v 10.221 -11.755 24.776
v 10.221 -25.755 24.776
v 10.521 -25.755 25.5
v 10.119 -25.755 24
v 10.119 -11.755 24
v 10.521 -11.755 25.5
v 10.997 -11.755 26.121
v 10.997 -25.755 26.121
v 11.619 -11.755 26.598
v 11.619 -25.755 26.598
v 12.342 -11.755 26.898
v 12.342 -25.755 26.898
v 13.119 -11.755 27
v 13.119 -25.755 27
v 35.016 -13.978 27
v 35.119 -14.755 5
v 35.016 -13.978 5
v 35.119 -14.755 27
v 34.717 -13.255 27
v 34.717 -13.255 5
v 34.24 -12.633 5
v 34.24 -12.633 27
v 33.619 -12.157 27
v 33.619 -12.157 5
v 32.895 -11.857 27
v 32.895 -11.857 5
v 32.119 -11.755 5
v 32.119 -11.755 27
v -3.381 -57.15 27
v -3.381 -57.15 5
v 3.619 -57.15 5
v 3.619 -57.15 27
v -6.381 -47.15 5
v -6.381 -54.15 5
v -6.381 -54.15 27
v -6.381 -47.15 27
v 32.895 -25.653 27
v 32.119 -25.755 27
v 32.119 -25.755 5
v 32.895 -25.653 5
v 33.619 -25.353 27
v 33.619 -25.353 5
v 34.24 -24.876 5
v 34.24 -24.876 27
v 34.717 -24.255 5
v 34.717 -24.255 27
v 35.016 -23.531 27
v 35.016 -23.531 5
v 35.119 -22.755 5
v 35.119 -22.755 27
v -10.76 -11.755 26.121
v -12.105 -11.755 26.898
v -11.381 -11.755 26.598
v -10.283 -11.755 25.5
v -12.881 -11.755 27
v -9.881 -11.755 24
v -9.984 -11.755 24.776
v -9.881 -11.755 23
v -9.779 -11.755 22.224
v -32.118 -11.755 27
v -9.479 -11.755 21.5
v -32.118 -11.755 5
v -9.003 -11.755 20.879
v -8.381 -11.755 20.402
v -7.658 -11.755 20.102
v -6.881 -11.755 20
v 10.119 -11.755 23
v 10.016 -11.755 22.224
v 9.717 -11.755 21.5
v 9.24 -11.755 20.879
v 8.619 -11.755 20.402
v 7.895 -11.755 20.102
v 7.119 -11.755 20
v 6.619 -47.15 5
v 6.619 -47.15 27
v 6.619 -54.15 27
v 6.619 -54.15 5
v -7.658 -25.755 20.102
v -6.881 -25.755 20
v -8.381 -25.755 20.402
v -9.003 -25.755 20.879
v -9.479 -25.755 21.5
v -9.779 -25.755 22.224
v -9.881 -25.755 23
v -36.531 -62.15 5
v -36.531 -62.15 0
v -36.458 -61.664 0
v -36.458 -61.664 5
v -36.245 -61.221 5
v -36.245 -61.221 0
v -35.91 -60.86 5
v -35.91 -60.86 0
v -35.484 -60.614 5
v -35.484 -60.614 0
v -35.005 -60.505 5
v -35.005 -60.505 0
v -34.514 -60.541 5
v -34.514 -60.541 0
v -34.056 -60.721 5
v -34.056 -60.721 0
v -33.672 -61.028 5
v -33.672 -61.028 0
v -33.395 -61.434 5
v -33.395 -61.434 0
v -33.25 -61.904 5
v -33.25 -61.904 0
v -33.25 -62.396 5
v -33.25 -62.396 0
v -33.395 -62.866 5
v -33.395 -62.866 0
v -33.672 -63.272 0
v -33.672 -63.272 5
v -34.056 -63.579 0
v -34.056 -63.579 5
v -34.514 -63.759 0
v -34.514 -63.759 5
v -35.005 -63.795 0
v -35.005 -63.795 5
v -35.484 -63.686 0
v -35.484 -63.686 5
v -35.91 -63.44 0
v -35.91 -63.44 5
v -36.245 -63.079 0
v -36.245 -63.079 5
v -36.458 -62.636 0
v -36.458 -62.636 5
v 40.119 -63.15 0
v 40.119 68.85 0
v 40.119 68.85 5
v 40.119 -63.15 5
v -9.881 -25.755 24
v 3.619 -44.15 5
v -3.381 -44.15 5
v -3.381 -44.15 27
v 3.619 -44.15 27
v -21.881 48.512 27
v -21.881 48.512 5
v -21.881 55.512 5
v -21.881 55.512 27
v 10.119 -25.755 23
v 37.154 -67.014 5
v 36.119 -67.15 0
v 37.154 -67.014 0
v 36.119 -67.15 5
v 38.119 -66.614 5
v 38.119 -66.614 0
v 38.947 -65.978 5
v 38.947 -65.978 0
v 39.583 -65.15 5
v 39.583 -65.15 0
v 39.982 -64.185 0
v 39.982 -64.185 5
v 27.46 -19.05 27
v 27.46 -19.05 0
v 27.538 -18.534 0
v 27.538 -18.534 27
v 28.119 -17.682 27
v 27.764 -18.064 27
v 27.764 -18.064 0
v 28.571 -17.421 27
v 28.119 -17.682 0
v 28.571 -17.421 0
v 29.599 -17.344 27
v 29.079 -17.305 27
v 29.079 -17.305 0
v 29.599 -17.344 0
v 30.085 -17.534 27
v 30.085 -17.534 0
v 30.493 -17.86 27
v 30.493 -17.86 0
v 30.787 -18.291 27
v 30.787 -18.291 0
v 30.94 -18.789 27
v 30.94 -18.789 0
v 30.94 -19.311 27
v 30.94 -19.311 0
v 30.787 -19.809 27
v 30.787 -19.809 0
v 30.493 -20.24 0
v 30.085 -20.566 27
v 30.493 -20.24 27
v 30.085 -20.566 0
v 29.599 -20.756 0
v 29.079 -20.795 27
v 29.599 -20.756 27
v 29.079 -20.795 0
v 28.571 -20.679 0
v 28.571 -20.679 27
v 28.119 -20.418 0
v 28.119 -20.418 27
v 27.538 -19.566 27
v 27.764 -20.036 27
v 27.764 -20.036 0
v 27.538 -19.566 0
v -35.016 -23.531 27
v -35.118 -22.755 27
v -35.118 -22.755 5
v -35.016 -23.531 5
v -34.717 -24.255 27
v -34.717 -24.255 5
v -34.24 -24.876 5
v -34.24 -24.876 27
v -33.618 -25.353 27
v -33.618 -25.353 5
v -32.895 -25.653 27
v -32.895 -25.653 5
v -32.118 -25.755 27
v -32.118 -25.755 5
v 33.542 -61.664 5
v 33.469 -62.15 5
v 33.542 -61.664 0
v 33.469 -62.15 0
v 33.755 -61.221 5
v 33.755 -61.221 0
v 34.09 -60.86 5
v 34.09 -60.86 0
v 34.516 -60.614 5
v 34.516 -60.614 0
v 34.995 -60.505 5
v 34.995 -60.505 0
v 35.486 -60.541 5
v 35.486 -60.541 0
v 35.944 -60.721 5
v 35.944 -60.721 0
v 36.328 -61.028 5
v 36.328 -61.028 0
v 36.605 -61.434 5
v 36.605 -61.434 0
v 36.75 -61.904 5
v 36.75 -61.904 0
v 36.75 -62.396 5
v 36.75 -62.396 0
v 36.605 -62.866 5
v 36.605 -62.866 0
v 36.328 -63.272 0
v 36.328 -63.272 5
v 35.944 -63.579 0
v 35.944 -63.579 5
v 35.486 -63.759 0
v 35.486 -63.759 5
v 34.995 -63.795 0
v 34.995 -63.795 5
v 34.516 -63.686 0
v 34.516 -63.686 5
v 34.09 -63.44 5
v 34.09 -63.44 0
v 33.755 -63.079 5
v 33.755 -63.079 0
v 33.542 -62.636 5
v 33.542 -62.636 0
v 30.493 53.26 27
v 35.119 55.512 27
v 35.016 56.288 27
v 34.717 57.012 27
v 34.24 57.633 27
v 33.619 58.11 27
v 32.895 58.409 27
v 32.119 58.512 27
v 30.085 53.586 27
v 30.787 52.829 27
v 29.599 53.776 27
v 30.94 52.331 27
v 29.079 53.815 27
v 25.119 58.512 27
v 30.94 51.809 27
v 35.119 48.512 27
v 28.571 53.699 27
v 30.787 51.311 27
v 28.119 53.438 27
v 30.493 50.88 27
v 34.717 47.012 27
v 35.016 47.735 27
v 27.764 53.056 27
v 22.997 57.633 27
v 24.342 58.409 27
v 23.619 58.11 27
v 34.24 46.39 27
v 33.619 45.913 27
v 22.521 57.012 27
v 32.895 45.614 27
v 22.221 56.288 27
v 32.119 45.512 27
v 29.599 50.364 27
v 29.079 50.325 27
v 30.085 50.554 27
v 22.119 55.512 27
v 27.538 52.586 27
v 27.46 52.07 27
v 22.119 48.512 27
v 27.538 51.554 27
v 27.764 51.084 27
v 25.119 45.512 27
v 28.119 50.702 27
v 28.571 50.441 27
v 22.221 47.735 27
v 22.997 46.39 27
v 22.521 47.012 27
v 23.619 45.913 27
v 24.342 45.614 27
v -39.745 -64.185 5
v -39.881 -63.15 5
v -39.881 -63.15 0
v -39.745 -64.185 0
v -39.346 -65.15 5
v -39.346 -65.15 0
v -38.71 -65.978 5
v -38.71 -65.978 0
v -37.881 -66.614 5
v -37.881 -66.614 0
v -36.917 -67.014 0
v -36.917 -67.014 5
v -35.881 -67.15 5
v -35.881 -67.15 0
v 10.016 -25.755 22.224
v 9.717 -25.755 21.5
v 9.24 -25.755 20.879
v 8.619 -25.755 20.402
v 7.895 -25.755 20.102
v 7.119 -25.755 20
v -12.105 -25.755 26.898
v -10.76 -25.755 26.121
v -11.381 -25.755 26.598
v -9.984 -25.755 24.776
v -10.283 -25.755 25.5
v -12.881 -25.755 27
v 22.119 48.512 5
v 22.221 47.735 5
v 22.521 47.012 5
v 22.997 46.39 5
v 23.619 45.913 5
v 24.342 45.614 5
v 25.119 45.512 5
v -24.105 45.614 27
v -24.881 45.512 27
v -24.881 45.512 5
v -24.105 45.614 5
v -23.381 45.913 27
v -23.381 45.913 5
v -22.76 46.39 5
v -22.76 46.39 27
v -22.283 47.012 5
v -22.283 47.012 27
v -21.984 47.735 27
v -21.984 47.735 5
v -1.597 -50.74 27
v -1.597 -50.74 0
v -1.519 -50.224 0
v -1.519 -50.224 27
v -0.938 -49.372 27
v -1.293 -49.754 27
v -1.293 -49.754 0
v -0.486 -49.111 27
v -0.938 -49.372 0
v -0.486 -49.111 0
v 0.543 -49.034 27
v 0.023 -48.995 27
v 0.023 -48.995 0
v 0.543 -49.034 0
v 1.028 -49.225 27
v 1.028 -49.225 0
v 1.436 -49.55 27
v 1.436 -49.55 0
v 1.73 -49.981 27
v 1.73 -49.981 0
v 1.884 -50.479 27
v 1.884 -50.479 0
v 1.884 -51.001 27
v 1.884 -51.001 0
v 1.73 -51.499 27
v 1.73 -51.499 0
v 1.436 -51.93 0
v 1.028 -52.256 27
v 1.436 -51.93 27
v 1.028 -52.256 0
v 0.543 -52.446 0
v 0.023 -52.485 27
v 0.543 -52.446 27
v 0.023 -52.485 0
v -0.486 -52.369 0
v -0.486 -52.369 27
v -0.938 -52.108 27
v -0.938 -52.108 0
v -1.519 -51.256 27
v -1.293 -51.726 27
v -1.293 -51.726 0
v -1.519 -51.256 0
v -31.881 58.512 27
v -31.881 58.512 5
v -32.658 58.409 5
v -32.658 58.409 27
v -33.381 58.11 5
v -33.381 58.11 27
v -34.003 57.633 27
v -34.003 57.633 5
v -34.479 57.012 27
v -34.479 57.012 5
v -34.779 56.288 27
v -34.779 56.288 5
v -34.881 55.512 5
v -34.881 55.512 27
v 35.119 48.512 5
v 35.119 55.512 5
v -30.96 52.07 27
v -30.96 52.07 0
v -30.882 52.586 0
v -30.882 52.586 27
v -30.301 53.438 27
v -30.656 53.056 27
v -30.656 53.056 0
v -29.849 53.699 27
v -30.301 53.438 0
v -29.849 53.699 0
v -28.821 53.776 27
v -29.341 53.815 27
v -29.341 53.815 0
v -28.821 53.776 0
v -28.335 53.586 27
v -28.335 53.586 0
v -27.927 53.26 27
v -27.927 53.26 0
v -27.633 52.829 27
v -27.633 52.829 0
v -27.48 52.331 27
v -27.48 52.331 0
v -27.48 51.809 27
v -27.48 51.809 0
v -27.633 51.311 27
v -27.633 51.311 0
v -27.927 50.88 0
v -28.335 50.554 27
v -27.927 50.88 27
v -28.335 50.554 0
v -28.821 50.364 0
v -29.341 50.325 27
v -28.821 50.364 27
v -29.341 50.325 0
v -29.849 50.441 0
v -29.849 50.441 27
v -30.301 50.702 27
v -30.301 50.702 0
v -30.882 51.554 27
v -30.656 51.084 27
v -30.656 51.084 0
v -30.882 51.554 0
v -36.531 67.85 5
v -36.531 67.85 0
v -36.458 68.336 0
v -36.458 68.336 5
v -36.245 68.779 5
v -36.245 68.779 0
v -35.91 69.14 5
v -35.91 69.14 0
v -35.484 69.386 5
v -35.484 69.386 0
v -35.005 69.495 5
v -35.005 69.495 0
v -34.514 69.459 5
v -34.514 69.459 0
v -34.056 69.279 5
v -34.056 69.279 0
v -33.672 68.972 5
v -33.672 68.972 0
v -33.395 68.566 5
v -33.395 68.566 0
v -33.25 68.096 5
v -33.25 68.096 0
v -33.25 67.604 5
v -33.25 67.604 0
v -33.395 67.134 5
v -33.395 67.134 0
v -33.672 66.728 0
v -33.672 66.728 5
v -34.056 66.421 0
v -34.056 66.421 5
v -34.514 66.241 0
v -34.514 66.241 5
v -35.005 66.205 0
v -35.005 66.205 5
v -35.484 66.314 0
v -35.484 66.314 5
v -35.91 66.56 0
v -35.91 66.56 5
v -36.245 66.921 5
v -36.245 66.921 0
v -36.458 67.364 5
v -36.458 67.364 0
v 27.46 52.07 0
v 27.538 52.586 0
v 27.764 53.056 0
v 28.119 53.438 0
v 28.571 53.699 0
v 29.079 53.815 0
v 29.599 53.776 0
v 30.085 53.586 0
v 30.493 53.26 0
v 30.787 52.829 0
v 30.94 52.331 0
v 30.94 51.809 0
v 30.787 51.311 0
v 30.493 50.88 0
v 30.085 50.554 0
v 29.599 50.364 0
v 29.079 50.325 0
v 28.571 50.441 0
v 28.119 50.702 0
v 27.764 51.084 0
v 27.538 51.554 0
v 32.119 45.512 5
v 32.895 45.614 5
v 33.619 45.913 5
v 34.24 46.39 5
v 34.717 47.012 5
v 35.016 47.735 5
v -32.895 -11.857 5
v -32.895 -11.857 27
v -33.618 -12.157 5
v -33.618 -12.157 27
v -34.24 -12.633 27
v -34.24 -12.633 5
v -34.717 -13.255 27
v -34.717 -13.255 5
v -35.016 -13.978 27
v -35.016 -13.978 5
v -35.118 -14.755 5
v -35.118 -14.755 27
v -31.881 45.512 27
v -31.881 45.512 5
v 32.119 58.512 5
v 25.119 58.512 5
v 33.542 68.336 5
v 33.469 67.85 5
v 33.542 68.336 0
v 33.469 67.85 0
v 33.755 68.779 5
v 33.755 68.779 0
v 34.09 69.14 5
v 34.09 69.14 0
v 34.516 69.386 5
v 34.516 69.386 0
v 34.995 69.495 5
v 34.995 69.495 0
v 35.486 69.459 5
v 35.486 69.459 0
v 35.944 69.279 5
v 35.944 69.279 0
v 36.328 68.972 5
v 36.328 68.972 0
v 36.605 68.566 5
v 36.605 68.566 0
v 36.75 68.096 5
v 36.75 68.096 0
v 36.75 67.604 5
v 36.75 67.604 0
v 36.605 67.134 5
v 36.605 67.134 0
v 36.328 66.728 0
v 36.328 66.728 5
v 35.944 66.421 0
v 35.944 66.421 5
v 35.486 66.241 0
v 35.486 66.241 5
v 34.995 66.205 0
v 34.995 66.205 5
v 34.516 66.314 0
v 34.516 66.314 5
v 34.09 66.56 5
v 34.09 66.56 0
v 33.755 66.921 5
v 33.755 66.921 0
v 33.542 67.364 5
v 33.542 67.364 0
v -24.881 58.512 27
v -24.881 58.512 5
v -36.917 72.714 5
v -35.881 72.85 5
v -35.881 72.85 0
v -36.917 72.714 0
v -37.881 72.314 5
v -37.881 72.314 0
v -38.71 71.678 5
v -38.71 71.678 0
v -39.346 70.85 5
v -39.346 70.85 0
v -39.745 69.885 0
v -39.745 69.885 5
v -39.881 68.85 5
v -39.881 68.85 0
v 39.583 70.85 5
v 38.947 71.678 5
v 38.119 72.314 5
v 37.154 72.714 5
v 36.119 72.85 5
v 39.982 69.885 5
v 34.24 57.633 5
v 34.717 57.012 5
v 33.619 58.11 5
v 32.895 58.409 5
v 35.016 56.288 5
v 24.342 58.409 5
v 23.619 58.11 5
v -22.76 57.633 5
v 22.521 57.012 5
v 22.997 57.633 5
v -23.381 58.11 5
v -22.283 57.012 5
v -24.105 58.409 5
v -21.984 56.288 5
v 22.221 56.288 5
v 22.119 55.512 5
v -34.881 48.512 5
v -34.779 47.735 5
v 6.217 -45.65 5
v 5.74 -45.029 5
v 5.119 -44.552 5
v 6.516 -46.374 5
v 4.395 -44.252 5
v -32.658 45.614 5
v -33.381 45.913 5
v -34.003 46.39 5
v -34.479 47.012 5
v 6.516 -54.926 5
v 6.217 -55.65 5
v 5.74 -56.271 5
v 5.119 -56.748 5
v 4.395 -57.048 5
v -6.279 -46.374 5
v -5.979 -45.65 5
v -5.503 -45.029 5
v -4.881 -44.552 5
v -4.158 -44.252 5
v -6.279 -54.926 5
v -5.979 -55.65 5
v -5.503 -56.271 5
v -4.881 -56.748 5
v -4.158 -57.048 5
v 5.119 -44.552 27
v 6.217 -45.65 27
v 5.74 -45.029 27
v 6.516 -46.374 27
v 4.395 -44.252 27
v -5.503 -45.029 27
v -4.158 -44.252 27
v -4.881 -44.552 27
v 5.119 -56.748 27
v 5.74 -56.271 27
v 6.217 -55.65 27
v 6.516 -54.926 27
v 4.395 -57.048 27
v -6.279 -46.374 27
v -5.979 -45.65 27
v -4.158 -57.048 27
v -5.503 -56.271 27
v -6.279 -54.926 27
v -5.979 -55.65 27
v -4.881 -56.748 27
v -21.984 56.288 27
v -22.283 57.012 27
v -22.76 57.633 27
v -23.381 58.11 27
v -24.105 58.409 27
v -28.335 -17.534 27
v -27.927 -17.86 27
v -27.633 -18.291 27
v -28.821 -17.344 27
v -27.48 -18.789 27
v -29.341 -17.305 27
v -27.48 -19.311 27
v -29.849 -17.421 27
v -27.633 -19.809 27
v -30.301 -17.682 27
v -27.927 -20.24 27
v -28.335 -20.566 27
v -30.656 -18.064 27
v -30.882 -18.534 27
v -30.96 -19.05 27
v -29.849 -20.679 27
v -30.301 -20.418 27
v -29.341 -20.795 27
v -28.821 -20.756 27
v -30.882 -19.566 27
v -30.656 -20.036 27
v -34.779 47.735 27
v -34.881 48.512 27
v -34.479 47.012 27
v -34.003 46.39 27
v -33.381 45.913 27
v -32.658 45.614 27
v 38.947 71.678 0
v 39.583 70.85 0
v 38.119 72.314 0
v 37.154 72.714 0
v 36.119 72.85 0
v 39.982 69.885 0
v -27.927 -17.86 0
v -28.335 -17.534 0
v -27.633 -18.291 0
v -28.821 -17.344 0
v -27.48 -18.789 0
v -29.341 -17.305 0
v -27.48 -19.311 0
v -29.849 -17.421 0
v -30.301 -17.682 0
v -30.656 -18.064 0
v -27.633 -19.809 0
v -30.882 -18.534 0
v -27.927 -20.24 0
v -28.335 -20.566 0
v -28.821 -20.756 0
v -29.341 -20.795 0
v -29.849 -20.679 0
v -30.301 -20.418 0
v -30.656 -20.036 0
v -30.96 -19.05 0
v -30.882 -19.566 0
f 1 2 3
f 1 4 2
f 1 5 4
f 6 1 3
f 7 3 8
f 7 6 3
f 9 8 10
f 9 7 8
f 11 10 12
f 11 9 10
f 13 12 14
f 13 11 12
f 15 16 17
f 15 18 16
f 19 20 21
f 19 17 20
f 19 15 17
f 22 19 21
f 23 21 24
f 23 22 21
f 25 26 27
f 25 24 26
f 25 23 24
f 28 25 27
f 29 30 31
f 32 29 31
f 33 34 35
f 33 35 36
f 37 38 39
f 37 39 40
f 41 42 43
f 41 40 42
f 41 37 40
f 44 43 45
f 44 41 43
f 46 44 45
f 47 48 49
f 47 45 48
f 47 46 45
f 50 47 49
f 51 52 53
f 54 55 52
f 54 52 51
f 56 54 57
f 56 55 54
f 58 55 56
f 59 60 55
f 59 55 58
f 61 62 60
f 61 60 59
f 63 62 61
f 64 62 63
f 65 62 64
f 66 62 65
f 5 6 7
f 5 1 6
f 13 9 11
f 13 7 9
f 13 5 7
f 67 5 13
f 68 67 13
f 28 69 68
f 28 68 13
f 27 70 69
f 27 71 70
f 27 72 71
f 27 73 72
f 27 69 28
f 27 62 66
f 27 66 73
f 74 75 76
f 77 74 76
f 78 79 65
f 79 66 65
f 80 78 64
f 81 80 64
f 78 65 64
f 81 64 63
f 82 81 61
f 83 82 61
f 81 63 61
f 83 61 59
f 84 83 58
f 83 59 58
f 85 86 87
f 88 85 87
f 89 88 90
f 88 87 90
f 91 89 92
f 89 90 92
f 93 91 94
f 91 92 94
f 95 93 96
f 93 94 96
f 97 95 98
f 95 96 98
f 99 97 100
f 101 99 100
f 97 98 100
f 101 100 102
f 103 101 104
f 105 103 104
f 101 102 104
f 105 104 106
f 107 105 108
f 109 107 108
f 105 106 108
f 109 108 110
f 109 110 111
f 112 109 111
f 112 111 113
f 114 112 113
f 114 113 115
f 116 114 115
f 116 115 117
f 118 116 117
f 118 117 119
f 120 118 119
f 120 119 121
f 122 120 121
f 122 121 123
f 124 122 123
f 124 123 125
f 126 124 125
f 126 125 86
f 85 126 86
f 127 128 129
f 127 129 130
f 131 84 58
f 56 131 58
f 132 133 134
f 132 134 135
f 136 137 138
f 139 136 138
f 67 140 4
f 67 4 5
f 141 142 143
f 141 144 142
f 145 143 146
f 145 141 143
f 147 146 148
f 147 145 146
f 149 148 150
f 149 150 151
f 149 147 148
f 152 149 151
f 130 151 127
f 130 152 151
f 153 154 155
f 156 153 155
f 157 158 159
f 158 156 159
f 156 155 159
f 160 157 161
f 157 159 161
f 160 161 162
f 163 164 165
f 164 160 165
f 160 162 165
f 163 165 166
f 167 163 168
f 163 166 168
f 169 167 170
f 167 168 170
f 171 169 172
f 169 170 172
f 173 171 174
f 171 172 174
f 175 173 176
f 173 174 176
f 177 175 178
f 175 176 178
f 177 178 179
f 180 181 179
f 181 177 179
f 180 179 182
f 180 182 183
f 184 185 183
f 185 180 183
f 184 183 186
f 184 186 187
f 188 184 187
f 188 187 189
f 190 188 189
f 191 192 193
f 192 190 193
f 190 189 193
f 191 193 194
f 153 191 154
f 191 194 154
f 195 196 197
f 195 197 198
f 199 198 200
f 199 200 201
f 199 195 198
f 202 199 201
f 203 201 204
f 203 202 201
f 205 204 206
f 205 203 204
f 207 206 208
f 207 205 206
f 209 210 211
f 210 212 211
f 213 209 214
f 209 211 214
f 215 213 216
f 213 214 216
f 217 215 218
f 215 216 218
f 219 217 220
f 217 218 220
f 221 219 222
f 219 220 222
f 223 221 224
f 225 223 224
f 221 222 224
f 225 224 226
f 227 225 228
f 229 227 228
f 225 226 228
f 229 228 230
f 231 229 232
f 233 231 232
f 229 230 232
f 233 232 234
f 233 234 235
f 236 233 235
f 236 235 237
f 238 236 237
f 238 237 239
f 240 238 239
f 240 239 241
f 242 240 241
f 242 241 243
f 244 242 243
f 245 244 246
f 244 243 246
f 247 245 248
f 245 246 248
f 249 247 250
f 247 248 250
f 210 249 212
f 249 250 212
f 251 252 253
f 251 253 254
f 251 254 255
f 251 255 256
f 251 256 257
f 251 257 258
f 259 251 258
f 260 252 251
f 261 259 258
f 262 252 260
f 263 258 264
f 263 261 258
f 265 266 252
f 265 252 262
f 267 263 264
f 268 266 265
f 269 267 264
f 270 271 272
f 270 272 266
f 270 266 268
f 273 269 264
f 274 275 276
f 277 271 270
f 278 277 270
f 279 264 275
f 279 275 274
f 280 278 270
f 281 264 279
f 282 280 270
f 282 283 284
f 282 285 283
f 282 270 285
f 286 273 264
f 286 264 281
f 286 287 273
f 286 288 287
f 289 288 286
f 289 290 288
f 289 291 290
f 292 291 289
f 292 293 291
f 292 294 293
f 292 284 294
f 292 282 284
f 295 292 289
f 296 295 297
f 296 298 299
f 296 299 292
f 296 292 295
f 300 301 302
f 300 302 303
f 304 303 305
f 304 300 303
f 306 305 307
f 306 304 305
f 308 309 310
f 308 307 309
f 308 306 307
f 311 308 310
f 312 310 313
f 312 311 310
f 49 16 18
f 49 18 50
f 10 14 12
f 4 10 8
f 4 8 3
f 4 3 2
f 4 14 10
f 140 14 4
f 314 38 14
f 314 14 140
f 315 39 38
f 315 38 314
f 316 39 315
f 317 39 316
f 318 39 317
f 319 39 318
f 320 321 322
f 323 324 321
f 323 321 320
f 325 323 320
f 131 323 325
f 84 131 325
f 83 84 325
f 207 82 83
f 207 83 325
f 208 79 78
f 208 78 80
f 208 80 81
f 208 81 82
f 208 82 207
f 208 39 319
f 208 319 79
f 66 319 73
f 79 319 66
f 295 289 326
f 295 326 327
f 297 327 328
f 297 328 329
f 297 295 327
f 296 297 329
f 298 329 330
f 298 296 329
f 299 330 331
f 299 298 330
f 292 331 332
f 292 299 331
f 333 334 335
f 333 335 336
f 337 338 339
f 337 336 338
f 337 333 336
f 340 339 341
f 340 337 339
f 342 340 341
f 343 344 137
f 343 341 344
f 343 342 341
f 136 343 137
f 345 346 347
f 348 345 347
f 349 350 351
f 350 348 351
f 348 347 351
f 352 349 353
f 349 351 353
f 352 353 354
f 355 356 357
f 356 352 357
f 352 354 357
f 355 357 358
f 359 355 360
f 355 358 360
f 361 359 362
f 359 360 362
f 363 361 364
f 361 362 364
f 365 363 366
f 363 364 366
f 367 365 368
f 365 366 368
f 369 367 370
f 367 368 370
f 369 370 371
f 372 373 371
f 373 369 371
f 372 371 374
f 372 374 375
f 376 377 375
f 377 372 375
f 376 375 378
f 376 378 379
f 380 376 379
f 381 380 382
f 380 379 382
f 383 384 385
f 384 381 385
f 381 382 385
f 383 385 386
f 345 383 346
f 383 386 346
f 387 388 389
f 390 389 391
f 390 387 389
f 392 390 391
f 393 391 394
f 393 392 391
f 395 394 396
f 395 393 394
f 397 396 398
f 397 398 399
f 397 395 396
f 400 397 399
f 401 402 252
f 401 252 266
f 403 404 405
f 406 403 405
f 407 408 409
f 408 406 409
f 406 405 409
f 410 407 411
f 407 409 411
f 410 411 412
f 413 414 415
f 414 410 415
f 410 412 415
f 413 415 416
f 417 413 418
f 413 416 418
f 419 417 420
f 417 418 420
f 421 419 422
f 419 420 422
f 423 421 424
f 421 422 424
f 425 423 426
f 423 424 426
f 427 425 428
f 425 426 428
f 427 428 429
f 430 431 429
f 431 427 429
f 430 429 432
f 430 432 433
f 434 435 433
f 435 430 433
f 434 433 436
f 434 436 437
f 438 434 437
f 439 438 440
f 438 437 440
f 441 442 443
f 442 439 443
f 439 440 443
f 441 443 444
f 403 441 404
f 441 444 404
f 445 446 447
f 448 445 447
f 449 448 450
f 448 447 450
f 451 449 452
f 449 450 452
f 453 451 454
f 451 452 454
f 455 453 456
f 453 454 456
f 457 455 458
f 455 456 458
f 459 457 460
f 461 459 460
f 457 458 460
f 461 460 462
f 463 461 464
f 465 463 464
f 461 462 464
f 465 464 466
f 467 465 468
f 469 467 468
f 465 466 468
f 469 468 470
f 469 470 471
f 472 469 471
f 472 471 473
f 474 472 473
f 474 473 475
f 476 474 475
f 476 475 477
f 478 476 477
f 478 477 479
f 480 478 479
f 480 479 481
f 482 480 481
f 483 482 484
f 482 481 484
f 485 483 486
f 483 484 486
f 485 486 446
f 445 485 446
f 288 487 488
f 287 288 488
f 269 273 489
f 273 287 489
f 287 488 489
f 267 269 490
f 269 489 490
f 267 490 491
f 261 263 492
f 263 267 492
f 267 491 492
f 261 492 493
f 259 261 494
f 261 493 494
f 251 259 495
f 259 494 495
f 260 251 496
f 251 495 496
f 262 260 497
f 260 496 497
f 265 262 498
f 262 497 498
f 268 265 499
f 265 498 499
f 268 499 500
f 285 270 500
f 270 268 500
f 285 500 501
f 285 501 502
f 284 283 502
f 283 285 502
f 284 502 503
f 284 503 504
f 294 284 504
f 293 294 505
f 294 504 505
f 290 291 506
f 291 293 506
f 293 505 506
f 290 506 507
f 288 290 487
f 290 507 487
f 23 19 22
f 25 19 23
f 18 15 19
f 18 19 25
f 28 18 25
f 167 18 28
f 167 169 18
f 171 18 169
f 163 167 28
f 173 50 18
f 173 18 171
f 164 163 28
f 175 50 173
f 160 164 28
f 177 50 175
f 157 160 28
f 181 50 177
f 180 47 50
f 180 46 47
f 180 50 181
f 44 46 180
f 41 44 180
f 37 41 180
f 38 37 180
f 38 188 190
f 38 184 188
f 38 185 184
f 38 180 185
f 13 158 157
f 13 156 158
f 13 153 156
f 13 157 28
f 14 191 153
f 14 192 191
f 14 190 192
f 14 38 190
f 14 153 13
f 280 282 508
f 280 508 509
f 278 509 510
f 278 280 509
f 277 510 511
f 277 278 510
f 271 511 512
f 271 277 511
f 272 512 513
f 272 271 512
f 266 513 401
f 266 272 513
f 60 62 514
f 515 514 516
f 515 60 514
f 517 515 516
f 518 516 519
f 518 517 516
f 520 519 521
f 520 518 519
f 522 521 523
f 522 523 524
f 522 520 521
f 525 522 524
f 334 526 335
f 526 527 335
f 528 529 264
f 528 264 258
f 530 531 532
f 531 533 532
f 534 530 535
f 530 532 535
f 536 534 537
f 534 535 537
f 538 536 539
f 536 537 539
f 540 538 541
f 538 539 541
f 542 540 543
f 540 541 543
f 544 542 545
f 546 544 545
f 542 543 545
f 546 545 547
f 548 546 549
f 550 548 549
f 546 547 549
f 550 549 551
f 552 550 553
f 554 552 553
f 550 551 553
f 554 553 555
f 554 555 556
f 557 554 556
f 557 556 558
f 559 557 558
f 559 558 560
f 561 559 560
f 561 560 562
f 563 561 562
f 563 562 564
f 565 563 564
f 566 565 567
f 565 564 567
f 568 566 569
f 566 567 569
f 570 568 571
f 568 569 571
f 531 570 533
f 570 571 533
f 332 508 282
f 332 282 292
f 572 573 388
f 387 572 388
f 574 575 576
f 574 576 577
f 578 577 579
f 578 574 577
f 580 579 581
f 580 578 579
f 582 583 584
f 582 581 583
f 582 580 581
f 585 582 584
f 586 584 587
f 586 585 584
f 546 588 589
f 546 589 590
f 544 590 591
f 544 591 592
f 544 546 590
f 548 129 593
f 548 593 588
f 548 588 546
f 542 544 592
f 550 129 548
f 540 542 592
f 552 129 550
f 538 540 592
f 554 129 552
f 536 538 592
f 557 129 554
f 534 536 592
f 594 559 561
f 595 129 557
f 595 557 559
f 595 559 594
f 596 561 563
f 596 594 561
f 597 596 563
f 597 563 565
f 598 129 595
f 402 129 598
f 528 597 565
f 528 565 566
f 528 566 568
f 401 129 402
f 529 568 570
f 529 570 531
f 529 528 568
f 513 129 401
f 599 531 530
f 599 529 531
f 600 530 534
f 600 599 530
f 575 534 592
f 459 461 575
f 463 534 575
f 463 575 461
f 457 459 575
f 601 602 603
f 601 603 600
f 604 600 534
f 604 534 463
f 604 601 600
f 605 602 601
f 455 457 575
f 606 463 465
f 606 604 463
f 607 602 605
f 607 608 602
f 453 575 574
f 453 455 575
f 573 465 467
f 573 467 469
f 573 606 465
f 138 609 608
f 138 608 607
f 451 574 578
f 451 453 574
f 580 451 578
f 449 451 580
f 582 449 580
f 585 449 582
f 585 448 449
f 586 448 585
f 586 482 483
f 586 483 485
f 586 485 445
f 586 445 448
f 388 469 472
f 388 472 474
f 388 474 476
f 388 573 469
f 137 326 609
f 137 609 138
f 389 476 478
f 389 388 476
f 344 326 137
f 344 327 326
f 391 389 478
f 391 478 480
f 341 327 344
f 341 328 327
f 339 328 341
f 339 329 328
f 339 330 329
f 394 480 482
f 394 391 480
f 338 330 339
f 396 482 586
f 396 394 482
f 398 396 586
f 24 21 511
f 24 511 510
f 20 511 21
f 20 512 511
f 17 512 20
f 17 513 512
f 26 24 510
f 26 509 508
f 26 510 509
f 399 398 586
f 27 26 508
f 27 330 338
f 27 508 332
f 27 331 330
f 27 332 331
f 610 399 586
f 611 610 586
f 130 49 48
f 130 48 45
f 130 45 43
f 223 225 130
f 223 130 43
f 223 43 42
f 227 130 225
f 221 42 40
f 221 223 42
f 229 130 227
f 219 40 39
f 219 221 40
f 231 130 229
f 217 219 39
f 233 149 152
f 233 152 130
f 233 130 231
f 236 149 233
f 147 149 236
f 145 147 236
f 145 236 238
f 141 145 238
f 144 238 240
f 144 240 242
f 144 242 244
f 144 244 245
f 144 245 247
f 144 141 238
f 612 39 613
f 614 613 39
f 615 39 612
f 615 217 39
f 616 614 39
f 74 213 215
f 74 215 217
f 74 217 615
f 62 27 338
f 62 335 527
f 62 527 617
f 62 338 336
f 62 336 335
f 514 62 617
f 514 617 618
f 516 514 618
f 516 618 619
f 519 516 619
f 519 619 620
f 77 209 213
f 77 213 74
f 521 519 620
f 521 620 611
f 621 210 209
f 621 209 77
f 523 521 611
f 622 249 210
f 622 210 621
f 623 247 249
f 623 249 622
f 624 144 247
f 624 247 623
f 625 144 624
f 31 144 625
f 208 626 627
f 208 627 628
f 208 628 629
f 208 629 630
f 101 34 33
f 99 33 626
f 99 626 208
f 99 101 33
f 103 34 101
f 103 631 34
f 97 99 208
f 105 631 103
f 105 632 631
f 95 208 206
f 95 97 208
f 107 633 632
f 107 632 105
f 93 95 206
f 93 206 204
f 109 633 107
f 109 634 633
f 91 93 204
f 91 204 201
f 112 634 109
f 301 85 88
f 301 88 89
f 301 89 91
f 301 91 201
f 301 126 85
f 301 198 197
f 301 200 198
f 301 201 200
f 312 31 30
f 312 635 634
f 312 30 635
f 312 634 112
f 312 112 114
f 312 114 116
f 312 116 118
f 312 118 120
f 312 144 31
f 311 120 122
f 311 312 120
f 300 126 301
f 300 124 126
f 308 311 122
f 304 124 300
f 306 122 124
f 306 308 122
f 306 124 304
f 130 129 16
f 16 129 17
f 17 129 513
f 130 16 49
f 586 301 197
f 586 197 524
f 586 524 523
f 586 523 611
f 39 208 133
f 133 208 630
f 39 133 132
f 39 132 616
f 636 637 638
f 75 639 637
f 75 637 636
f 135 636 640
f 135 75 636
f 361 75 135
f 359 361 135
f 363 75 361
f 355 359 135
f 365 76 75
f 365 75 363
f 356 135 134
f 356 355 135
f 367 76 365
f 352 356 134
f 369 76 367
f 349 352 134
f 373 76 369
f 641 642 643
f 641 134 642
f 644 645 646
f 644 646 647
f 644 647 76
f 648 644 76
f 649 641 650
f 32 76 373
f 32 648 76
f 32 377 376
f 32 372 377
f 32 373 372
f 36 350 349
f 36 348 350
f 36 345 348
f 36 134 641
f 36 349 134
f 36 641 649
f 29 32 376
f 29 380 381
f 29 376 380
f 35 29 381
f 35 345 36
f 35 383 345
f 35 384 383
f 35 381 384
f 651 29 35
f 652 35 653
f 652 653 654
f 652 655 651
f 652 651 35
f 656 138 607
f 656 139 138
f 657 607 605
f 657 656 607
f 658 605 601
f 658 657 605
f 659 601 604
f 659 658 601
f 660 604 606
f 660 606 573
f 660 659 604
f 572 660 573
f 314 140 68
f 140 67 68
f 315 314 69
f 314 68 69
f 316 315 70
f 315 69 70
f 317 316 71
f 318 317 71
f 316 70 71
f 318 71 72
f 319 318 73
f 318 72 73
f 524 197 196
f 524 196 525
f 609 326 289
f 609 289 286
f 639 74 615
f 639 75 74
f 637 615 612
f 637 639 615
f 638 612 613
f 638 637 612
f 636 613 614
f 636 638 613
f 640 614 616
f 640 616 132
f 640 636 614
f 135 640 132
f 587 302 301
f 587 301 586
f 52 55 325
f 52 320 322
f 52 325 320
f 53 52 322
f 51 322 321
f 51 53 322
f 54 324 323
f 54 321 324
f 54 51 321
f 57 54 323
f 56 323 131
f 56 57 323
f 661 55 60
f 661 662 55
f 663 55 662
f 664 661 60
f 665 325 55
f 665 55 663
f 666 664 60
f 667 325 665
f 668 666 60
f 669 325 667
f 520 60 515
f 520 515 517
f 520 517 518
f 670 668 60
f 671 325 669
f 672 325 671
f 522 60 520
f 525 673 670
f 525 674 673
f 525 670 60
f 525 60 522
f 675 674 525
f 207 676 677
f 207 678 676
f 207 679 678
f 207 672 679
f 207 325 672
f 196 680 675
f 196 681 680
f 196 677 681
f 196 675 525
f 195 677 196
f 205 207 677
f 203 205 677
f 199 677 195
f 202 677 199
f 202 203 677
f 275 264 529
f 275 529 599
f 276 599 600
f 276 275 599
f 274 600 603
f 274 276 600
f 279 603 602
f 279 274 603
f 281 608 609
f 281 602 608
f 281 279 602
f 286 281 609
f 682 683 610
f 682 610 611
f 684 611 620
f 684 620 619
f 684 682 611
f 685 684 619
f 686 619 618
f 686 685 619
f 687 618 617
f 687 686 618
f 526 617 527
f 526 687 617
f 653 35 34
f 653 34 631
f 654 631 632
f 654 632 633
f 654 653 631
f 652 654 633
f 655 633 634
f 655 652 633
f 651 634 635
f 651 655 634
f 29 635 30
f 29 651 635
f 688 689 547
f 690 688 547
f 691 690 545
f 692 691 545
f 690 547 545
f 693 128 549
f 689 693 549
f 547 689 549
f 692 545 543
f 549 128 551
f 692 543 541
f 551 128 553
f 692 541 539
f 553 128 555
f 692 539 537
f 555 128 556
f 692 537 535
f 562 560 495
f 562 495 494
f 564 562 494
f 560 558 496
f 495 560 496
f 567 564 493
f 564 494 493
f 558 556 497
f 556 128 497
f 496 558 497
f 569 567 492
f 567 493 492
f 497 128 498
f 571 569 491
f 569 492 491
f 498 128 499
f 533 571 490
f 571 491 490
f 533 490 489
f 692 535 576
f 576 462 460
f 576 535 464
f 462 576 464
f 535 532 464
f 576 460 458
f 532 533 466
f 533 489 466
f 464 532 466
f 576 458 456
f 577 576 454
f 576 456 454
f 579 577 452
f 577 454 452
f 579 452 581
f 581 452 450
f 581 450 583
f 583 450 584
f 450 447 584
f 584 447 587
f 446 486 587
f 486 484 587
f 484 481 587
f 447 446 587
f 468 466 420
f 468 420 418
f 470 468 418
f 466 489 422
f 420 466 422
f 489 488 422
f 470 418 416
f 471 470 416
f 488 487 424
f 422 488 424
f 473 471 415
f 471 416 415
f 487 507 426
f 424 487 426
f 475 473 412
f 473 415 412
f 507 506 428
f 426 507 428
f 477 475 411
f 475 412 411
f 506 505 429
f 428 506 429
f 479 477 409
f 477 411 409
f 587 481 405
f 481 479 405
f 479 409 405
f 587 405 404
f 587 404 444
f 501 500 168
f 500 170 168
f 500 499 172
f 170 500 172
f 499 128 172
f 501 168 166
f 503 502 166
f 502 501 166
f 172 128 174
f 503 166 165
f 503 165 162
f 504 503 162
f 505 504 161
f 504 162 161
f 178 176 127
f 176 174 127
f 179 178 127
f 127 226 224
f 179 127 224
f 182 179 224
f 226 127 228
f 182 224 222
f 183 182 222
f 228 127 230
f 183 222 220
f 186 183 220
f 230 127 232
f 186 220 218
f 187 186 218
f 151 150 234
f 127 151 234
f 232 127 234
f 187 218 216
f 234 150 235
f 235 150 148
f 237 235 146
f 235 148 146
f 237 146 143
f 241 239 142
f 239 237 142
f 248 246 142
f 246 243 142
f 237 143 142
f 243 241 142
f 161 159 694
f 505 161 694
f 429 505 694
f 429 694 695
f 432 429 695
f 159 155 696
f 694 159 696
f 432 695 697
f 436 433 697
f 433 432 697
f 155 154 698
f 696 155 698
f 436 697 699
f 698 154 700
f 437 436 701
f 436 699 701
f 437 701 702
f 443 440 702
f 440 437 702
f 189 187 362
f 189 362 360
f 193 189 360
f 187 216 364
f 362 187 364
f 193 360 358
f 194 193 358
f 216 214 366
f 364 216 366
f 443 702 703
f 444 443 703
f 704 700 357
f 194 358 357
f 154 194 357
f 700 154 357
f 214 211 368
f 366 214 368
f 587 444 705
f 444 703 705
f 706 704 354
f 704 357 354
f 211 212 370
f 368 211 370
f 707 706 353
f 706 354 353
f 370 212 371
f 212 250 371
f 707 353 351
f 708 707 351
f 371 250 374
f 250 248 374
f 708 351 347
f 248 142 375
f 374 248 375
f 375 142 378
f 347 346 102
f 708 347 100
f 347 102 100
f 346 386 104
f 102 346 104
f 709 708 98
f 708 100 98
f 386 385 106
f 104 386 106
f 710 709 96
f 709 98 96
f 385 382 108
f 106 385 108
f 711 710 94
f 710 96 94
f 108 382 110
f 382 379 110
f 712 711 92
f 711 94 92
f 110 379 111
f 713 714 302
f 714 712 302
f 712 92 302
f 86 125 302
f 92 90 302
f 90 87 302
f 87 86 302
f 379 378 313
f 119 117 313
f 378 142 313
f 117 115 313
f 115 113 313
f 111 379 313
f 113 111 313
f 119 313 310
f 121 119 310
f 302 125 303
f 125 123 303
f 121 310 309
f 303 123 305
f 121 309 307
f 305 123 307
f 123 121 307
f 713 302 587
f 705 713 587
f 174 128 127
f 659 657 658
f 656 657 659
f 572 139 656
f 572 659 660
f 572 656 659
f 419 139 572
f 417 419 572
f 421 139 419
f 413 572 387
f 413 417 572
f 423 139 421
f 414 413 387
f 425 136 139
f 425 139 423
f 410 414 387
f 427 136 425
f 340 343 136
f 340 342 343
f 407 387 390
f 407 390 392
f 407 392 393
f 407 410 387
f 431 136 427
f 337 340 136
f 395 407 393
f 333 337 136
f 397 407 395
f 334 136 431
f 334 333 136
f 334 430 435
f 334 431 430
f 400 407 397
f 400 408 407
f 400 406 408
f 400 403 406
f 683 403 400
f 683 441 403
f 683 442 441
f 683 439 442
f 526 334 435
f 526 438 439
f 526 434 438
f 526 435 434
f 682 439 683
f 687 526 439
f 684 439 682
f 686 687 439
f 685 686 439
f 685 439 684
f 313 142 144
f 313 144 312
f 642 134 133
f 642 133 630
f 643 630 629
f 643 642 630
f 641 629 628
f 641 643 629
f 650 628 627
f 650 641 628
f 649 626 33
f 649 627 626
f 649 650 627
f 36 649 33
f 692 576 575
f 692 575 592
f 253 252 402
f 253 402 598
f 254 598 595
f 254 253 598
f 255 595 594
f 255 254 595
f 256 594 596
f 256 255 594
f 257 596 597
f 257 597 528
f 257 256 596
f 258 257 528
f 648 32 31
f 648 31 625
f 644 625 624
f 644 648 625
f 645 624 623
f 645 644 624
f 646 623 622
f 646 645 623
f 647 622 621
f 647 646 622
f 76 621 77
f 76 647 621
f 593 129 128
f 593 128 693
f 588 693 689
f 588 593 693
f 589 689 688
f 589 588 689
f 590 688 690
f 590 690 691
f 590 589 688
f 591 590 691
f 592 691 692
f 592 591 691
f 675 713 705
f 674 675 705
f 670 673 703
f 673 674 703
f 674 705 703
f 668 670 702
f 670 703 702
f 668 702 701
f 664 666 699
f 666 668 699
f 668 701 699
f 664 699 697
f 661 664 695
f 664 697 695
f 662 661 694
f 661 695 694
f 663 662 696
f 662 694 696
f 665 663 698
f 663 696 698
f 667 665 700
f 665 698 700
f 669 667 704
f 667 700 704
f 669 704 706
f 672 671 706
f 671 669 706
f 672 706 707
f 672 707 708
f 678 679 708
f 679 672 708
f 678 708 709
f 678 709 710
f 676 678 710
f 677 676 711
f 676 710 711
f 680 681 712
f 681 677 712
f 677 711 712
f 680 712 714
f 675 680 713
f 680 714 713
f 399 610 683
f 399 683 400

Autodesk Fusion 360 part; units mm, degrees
sketch "Sketch2" plane through (0, 0, 0) normal (0, 0, 1) x (-1, 0, 0)
  line L0 (29.6528, -57.1307) -> (30.0921, -57.0728)
  line L1 (30.0921, -57.0728) -> (30.5248, -56.9769)
  line L2 (30.5248, -56.9769) -> (30.9475, -56.8436)
  line L3 (30.9475, -56.8436) -> (31.3569, -56.674)
  line L4 (31.3569, -56.674) -> (31.75, -56.4694)
  line L5 (31.75, -56.4694) -> (32.1238, -56.2313)
  line L6 (32.1238, -56.2313) -> (32.4754, -55.9615)
  line L7 (32.4754, -55.9615) -> (32.8021, -55.6621)
  line L8 (32.8021, -55.6621) -> (33.1015, -55.3354)
  line L9 (33.1015, -55.3354) -> (33.3713, -54.9838)
  line L10 (33.3713, -54.9838) -> (33.6094, -54.61)
  line L11 (33.6094, -54.61) -> (33.814, -54.2169)
  line L12 (33.814, -54.2169) -> (33.9836, -53.8075)
  line L13 (33.9836, -53.8075) -> (34.1169, -53.3848)
  line L14 (34.1169, -53.3848) -> (34.2128, -52.9521)
  line L15 (34.2128, -52.9521) -> (34.2707, -52.5128)
  line L16 (34.2707, -52.5128) -> (34.29, -52.07)
  line L17 (34.29, -52.07) -> (34.29, 52.07)
  line L18 (34.29, 52.07) -> (34.2707, 52.5128)
  line L19 (34.2707, 52.5128) -> (34.2128, 52.9521)
  line L20 (34.2128, 52.9521) -> (34.1169, 53.3848)
  line L21 (34.1169, 53.3848) -> (33.9836, 53.8075)
  line L22 (33.9836, 53.8075) -> (33.814, 54.2169)
  line L23 (33.814, 54.2169) -> (33.6094, 54.61)
  line L24 (33.6094, 54.61) -> (33.3713, 54.9838)
  line L25 (33.3713, 54.9838) -> (33.1015, 55.3354)
  line L26 (33.1015, 55.3354) -> (32.8021, 55.6621)
  line L27 (32.8021, 55.6621) -> (32.4754, 55.9615)
  line L28 (32.4754, 55.9615) -> (32.1238, 56.2313)
  line L29 (32.1238, 56.2313) -> (31.75, 56.4694)
  line L30 (31.75, 56.4694) -> (31.3569, 56.674)
  line L31 (31.3569, 56.674) -> (30.9475, 56.8436)
  line L32 (30.9475, 56.8436) -> (30.5248, 56.9769)
  line L33 (30.5248, 56.9769) -> (30.0921, 57.0728)
  line L34 (30.0921, 57.0728) -> (29.6528, 57.1307)
  line L35 (29.6528, 57.1307) -> (29.21, 57.15)
  line L36 (29.21, 57.15) -> (-29.21, 57.15)
  line L37 (-29.21, 57.15) -> (-29.6528, 57.1307)
  line L38 (-29.6528, 57.1307) -> (-30.0921, 57.0728)
  line L39 (-30.0921, 57.0728) -> (-30.5248, 56.9769)
  line L40 (-30.5248, 56.9769) -> (-30.9475, 56.8436)
  line L41 (-30.9475, 56.8436) -> (-31.3569, 56.674)
  line L42 (-31.3569, 56.674) -> (-31.75, 56.4694)
  line L43 (-31.75, 56.4694) -> (-32.1238, 56.2313)
  line L44 (-32.1238, 56.2313) -> (-32.4754, 55.9615)
  line L45 (-32.4754, 55.9615) -> (-32.8021, 55.6621)
  line L46 (-32.8021, 55.6621) -> (-33.1015, 55.3354)
  line L47 (-33.1015, 55.3354) -> (-33.3713, 54.9838)
  line L48 (-33.3713, 54.9838) -> (-33.6094, 54.61)
  line L49 (-33.6094, 54.61) -> (-33.814, 54.2169)
  line L50 (-33.814, 54.2169) -> (-33.9836, 53.8075)
  line L51 (-33.9836, 53.8075) -> (-34.1169, 53.3848)
  line L52 (-34.1169, 53.3848) -> (-34.2128, 52.9521)
  line L53 (-34.2128, 52.9521) -> (-34.2707, 52.5128)
  line L54 (-34.2707, 52.5128) -> (-34.29, 52.07)
  line L55 (-34.29, 52.07) -> (-34.29, -52.07)
  line L56 (-34.29, -52.07) -> (-34.2707, -52.5128)
  line L57 (-34.2707, -52.5128) -> (-34.2128, -52.9521)
  line L58 (-34.2128, -52.9521) -> (-34.1169, -53.3848)
  line L59 (-34.1169, -53.3848) -> (-33.9836, -53.8075)
  line L60 (-33.9836, -53.8075) -> (-33.814, -54.2169)
  line L61 (-33.814, -54.2169) -> (-33.6094, -54.61)
  line L62 (-33.6094, -54.61) -> (-33.3713, -54.9838)
  line L63 (-33.3713, -54.9838) -> (-33.1015, -55.3354)
  line L64 (-33.1015, -55.3354) -> (-32.8021, -55.6621)
  line L65 (-32.8021, -55.6621) -> (-32.4754, -55.9615)
  line L66 (-32.4754, -55.9615) -> (-32.1238, -56.2313)
  line L67 (-32.1238, -56.2313) -> (-31.75, -56.4694)
  line L68 (-31.75, -56.4694) -> (-31.3569, -56.674)
  line L69 (-31.3569, -56.674) -> (-30.9475, -56.8436)
  line L70 (-30.9475, -56.8436) -> (-30.5248, -56.9769)
  line L71 (-30.5248, -56.9769) -> (-30.0921, -57.0728)
  line L72 (-30.0921, -57.0728) -> (-29.6528, -57.1307)
  line L73 (-29.6528, -57.1307) -> (-29.21, -57.15)
  line L74 (-29.21, -57.15) -> (29.21, -57.15)
  line L75 (29.21, -57.15) -> (29.6528, -57.1307)
  circle A0 centre (26.67, 50.025) radius 0.7
  circle A1 centre (20.32, 50.025) radius 0.7
  circle A2 centre (26.67, 33.795) radius 0.7
  circle A3 centre (20.32, 33.795) radius 0.7
  circle A4 centre (13.97, 50.025) radius 0.7
  circle A5 centre (13.97, 33.795) radius 0.7
  circle A6 centre (5.13, 26.87) radius 1.15
  circle A7 centre (29.21, 19.05) radius 1.75
  circle A8 centre (5.13, 22.17) radius 1.15
  circle A9 centre (5.13, 17.47) radius 1.15
  circle A10 centre (-0.1534, 50.7401) radius 1.75
  circle A11 centre (-14.15, 50.025) radius 0.7
  circle A12 centre (-0.17, 26.87) radius 1.15
  circle A13 centre (-5.47, 26.87) radius 1.15
  circle A14 centre (-14.15, 33.795) radius 0.7
  circle A15 centre (-20.5, 50.025) radius 0.7
  circle A16 centre (-26.85, 50.025) radius 0.7
  circle A17 centre (-20.5, 33.795) radius 0.7
  circle A18 centre (-26.85, 33.795) radius 0.7
  circle A19 centre (-0.17, 22.17) radius 1.15
  circle A20 centre (-5.47, 22.17) radius 1.15
  circle A21 centre (-0.17, 17.47) radius 1.15
  circle A22 centre (-5.47, 17.47) radius 1.15
  circle A23 centre (-0.17, 3.81) radius 0.45
  circle A24 centre (-0.17, 1.27) radius 0.45
  circle A25 centre (-29.21, 19.05) radius 1.75
  circle A26 centre (31.724, -24.1849) radius 0.45
  circle A27 centre (29.184, -24.1849) radius 0.45
  circle A28 centre (26.67, -36.505) radius 0.55
  circle A29 centre (24.13, -36.505) radius 0.55
  circle A30 centre (21.59, -36.505) radius 0.55
  circle A31 centre (29.21, -52.07) radius 1.75
  circle A32 centre (21.59, -44.45) radius 0.5
  circle A33 centre (19.05, -44.45) radius 0.5
  circle A34 centre (11.43, -44.45) radius 0.5
  circle A35 centre (8.89, -44.45) radius 0.5
  circle A36 centre (-13.105, -19.09) radius 0.4
  circle A37 centre (-17.985, -19.09) radius 0.4
  circle A38 centre (-0.205, -41.91) radius 0.5
  circle A39 centre (-2.745, -41.91) radius 0.5
  circle A40 centre (-5.285, -41.91) radius 0.5
  circle A41 centre (-29.21, -52.07) radius 1.75
  circle A42 centre (29.21, 19.05) radius 1.75
  circle A43 centre (-0.1534, 50.7401) radius 1.75
  circle A44 centre (-29.21, 19.05) radius 1.75
  circle A45 centre (29.21, -52.07) radius 1.75
  circle A46 centre (-29.21, -52.07) radius 1.75
  line L76 (-40.1186, 67.15) -> (39.8814, 67.15)
  line L77 (39.8814, 67.15) -> (39.8814, -72.85)
  line L78 (39.8814, -72.85) -> (-40.1186, -72.85)
  line L79 (-40.1186, -72.85) -> (-40.1186, 67.15)
  line L80 (-35.1186, -67.85) -> (-35.1186, 62.15)
  line L81 (-35.1186, 62.15) -> (34.8814, 62.15)
  line L82 (34.8814, 62.15) -> (34.8814, -67.85)
  line L83 (34.8814, -67.85) -> (-35.1186, -67.85)
  circle A47 centre (-35.1186, 62.15) radius 1.65
  circle A48 centre (34.8814, 62.15) radius 1.65
  circle A49 centre (34.8814, -67.85) radius 1.65
  circle A50 centre (-35.1186, -67.85) radius 1.65
  line L84 (-35.1186, 25.7548) -> (35.1185, 25.7548)
  line L85 (35.1185, 25.7548) -> (35.1185, 11.7548)
  line L86 (35.1185, 11.7548) -> (-35.1186, 11.7548)
  line L87 (-35.1186, 11.7548) -> (-35.1186, 25.7548)
  line L88 (-0.1186, 67.15) -> (-0.1186, -72.85) construction
  line L89 (-10.1186, 25.7548) -> (-10.1186, 11.7548)
  line L90 (9.8814, 25.7548) -> (9.8814, 11.7548)
  line L91 (-35.1186, -45.5115) -> (-22.1186, -45.5115)
  line L92 (-22.1186, -45.5115) -> (-22.1186, -58.5115)
  line L93 (-22.1186, -58.5115) -> (-35.1186, -58.5115)
  line L94 (-35.1186, -58.5115) -> (-35.1186, -45.5115)
  line L95 (21.8814, -45.5115) -> (21.8814, -58.5115)
  line L96 (34.8814, -45.5115) -> (21.8814, -45.5115)
  line L97 (21.8814, -58.5115) -> (34.8814, -58.5115)
  line L98 (-6.6186, 57.15) -> (6.3814, 57.15)
  line L99 (6.3814, 57.15) -> (6.3814, 44.15)
  line L100 (6.3814, 44.15) -> (-6.6186, 44.15)
  line L101 (-6.6186, 44.15) -> (-6.6186, 57.15)
  dimension "d1" = 80
  dimension "d2" = 140
  dimension "d4" = 5
  dimension "d6" = 3.3
  dimension "d7" = 3.3
  dimension "d8" = 3.3
  dimension "d9" = 3.3
  dimension "d11" = 14
  dimension "d12" = 10
  dimension "d13" = 13
  dimension "d14" = 13
  dimension "d15" = 13
  dimension "d16" = 13
  dimension "d35" = 10
extrude "Extrude1" add sketch "Sketch2" along normal blind 5 contours L0 L1 L2 L3 L4 L5 L6 L7 L8 L9 L10 L11 L12 L13 L14 L15 L16 L17 L74 L75 L95 L96 | L0 L1 L2 L3 L4 L5 L6 L7 L8 L9 L10 L11 L12 L13 L14 L15 L16 L17 L74 L75 L82 L95 L96 L97 | L74 L80 L82 L83 A49 A50 L92 L93 L95 L97 | L17 L55 L74 L86 L91 L92 L95 L96 | L55 L56 L57 L58 L59 L60 L61 L62 L63 L64 L65 L66 L67 L68 L69 L70 L71 L72 L73 L74 L80 L91 L92 L93 L94 | L55 L56 L57 L58 L59 L60 L61 L62 L63 L64 L65 L66 L67 L68 L69 L70 L71 L72 L73 L74 L91 L92 | L17 L82 L86 L96 | L55 L80 L86 L91 | L17 L84 L86 L90 | L17 L82 L84 L86 | L55 L80 L84 L86 L87 | L55 L84 L86 L89 | L17 L18 L19 L20 L21 L22 L23 L24 L25 L26 L27 L28 L29 L30 L31 L32 L33 L34 L35 L36 L37 L38 L39 L40 L41 L42 L43 L44 L45 L46 L47 L48 L49 L50 L51 L52 L53 L54 L55 A6 A12 A13 L84 L99 L100 L101 | L17 L18 L19 L20 L21 L22 L23 L24 L25 L26 L27 L28 L29 L30 L31 L32 L33 L34 L35 L36 L37 L38 L39 L40 L41 L42 L43 L44 L45 L46 L47 L48 L49 L50 L51 L52 L53 L54 L55 L80 L81 L82 A47 A48 L84 L98 | L82 L84 L85 L86 | A6 A12 A13 L84 L86 L89 L90 | A6 L84 | A6 L84 | A13 L84 | A13 L84 | A12 L84 | A12 L84 | L36 L98 L99 L100 L101 | A0 | A1 | A2 | A3 | A4 | A5 | A8 | A9 | A11 | A14 | A15 | A16 | A17 | A18 | A19 | A20 | A21 | A22 | A23 | A24 | A26 | A27 | A28 | A29 | A30 | A32 | A33 | A34 | A35 | A36 | A37 | A38 | A39 | A40 | L76 L77 L78 L79
extrude "Extrude2" add sketch "Sketch2" along normal blind 27 contours L0 L1 L2 L3 L4 L5 L6 L7 L8 L9 L10 L11 L12 L13 L14 L15 L16 L17 L74 L75 L95 L96 | L0 L1 L2 L3 L4 L5 L6 L7 L8 L9 L10 L11 L12 L13 L14 L15 L16 L17 L74 L75 L82 L95 L96 L97 | L55 L56 L57 L58 L59 L60 L61 L62 L63 L64 L65 L66 L67 L68 L69 L70 L71 L72 L73 L74 L80 L91 L92 L93 L94 | L55 L56 L57 L58 L59 L60 L61 L62 L63 L64 L65 L66 L67 L68 L69 L70 L71 L72 L73 L74 L91 L92 | L17 L84 L86 L90 | L17 L82 L84 L86 | L55 L80 L84 L86 L87 | L55 L84 L86 L89 | L82 L84 L85 L86 | L36 L98 L99 L100 L101
fillet "Fillet1" radius 3 2 edges at (-34.8814, 58.5115, 16) (35.1186, 58.5115, 16)
fillet "Fillet1" radius 3 6 edges at (35.1186, 45.5115, 16) (22.1186, 45.5115, 16) (22.1186, 58.5115, 16) (-21.8814, 45.5115, 16) (-21.8814, 58.5115, 16) (-34.8814, 45.5115, 16)
fillet "Fillet1" radius 3 4 edges at (6.6186, -44.15, 16) (6.6186, -57.15, 16) (-6.3814, -44.15, 16) (-6.3814, -57.15, 16)
fillet "Fillet2" radius 4 4 edges at (40.1186, 72.85, 2.5) (-39.8814, 72.85, 2.5) (40.1186, -67.15, 2.5) (-39.8814, -67.15, 2.5)
extrude "Extrude3" add sketch "Sketch2" along normal blind 20 contours A6 A12 A13 L84 L86 L89 L90 | A6 L84 | A13 L84 | A12 L84 | A8 | A9 | A19 | A20 | A21 | A22 picked at (5.0829, 25.7461) picked at (-5.5171, 25.7461) picked at (-0.2171, 25.7461)
fillet "Fillet3" radius 3 4 edges at (-9.8814, -18.7548, 20) (-9.8814, -18.7548, 27) (10.1186, -18.7548, 27) (10.1186, -18.7548, 20)
fillet "Fillet4" radius 3 4 edges at (35.1186, -25.7548, 16) (35.1186, -11.7548, 16) (-35.1185, -25.7548, 16) (-35.1185, -11.7548, 16)
